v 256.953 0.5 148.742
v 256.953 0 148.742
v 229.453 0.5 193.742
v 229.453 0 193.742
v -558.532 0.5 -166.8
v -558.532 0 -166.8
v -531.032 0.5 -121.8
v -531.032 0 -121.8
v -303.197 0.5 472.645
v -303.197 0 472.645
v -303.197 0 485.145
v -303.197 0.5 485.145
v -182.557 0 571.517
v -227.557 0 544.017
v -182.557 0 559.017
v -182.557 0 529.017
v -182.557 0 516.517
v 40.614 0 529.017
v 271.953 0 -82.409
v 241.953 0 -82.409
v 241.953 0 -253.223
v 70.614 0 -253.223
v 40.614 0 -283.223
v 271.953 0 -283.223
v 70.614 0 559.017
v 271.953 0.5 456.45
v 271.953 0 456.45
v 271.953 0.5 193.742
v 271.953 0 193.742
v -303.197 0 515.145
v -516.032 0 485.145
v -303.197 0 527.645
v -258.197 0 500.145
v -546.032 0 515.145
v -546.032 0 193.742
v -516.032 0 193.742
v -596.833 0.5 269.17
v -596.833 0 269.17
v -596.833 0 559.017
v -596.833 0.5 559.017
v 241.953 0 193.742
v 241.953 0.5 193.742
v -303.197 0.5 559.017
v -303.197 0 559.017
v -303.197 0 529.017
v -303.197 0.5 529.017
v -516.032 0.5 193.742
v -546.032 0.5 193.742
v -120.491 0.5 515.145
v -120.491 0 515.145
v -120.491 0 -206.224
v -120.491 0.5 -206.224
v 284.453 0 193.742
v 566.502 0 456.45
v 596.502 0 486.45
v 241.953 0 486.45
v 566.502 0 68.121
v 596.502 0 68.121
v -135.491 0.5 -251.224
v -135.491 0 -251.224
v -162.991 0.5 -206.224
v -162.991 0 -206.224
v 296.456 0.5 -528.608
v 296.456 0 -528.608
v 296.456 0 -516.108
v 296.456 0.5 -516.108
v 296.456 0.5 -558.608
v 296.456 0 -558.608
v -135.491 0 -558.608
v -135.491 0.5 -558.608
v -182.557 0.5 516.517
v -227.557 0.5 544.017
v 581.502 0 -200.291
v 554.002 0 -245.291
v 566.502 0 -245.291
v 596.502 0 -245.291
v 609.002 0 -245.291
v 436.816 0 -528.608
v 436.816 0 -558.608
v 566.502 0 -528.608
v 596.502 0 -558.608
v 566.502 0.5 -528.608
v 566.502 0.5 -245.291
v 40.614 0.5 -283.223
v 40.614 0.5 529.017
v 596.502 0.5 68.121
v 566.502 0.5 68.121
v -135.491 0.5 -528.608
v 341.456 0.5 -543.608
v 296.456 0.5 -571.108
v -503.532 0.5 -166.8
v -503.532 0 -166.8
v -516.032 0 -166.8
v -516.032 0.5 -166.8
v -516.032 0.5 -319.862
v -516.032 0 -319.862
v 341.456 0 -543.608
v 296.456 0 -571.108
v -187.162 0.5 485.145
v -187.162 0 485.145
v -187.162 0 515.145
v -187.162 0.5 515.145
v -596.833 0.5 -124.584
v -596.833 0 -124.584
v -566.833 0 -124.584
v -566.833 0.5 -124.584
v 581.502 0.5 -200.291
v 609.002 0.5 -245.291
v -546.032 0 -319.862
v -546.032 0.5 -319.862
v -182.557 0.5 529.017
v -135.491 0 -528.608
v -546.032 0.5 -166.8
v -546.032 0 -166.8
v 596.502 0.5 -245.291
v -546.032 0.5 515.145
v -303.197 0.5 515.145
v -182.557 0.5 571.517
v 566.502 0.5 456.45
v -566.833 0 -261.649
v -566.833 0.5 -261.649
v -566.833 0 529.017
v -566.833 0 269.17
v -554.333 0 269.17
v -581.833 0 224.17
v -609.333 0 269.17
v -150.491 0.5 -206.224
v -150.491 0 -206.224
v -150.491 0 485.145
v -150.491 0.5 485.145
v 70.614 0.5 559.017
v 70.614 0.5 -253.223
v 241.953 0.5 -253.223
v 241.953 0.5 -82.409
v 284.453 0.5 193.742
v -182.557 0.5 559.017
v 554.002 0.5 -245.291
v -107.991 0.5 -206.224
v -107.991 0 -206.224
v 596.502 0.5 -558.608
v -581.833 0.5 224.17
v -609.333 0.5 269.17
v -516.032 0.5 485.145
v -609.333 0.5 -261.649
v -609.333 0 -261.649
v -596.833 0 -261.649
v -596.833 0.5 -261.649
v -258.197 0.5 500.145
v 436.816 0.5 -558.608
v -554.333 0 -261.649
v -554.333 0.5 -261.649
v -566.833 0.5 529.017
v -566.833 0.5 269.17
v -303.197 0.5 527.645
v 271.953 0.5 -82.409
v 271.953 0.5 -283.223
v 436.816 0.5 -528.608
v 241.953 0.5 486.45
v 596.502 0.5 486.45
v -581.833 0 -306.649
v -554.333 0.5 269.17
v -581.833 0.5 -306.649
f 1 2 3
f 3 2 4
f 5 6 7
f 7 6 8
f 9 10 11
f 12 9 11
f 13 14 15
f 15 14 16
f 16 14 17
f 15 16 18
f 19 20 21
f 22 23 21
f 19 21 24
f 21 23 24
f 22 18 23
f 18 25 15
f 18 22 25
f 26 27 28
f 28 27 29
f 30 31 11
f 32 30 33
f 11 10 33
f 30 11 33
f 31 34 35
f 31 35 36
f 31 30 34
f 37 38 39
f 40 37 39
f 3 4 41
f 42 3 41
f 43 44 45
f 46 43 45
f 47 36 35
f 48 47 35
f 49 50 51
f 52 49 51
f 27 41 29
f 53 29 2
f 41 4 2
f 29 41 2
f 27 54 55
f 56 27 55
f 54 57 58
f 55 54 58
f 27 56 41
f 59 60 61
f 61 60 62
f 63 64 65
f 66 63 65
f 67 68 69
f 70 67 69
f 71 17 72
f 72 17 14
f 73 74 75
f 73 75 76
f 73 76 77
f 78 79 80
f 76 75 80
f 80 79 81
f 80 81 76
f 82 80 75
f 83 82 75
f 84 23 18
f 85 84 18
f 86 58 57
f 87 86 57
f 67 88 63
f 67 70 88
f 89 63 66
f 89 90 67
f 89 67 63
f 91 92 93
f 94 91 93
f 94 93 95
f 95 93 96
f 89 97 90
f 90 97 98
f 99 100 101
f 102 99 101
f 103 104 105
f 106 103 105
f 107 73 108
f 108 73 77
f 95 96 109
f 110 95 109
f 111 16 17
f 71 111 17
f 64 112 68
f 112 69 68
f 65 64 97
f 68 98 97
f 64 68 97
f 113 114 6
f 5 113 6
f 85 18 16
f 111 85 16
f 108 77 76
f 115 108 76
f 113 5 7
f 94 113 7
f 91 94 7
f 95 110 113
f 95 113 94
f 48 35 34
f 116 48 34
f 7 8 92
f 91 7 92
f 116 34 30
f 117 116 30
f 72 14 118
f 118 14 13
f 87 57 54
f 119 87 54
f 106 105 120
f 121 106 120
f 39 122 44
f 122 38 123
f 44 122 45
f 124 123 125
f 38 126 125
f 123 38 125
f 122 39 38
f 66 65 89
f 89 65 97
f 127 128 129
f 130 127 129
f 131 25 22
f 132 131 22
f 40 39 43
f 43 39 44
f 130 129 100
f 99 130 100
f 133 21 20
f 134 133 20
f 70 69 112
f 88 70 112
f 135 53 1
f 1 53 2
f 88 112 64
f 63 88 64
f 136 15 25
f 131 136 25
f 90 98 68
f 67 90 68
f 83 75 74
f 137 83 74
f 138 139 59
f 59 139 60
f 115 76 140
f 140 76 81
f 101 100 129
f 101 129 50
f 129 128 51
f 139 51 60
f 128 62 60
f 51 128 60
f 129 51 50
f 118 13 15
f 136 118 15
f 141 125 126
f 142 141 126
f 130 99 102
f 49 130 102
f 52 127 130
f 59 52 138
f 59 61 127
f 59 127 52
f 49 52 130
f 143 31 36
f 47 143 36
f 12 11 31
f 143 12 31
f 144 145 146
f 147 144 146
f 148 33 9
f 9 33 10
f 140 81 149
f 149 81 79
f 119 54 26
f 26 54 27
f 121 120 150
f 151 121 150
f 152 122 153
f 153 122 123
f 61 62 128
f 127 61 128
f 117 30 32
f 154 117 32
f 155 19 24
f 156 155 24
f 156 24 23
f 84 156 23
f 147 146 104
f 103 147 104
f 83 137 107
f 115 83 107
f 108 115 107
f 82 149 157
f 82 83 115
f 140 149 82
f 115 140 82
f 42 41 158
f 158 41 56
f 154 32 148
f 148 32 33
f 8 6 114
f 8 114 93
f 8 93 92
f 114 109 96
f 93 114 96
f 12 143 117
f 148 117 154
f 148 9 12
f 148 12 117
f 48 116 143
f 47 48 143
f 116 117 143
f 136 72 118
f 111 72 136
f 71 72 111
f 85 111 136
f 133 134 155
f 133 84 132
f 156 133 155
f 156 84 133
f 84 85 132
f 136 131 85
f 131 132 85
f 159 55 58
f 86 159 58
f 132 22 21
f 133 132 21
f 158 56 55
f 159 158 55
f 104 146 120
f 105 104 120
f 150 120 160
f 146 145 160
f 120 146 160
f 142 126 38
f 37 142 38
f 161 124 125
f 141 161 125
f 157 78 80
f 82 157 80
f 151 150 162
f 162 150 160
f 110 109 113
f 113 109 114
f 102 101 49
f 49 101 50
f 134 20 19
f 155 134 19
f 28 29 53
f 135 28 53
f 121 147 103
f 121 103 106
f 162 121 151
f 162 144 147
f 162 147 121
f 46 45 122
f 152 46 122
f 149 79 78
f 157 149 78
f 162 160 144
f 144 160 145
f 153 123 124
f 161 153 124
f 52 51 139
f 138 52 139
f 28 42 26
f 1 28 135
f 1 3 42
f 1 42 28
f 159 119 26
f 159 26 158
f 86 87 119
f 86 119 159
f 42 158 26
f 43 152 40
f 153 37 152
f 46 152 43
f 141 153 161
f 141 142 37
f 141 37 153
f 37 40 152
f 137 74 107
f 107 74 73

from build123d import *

# Parameters (mm, degrees)
BOSS_EXTRUDE2_DEPTH   = 0.5
BOSS_EXTRUDE2_2_DEPTH = 0.5
BOSS_EXTRUDE2_3_DEPTH = 0.5
BOSS_EXTRUDE2_4_DEPTH = 0.5
BOSS_EXTRUDE2_5_DEPTH = 0.5
BOSS_EXTRUDE2_6_DEPTH = 0.5
BOSS_EXTRUDE2_7_DEPTH = 0.5
BOSS_EXTRUDE2_8_DEPTH = 0.5
BOSS_EXTRUDE2_9_DEPTH = 0.5


with BuildPart() as part:
    # Sketch2 → Boss-Extrude2 (new body)
    with BuildSketch(Plane(origin=(0, 0, 0), x_dir=(1, 0, 0), z_dir=(0, 1, 0))):
        Polygon((-546.031568855, 319.862112689), (-546.031568855, 166.799956279), (-558.531568855, 166.799956279), (-531.031568855, 121.799956279), (-503.531568855, 166.799956279), (-516.031568855, 166.799956279), (-516.031568855, 319.862112689), align=None)
    extrude(amount=BOSS_EXTRUDE2_DEPTH)


with BuildPart() as body_2:
    # Sketch2 → Boss-Extrude2 2 (new body)
    with BuildSketch(Plane(origin=(0, 0, 0), x_dir=(1, 0, 0), z_dir=(0, 1, 0))):
        Polygon((-566.833224962, 124.583741857), (-566.833224962, 261.648764577), (-554.333224962, 261.648764577), (-581.833224962, 306.648764577), (-609.333224962, 261.648764577), (-596.833224962, 261.648764577), (-596.833224962, 124.583741857), align=None)
    extrude(amount=BOSS_EXTRUDE2_2_DEPTH)


with BuildPart() as body_3:
    # Sketch2 → Boss-Extrude2 3 (new body)
    with BuildSketch(Plane(origin=(0, 0, 0), x_dir=(1, 0, 0), z_dir=(0, 1, 0))):
        Polygon((-546.031568855, -193.74164228), (-546.031568855, -515.145479506), (-303.196960885, -515.145479506), (-303.196960885, -527.645479506), (-258.196960885, -500.145479506), (-303.196960885, -472.645479506), (-303.196960885, -485.145479506), (-516.031568855, -485.145479506), (-516.031568855, -193.74164228), align=None)
    extrude(amount=BOSS_EXTRUDE2_3_DEPTH)


with BuildPart() as body_4:
    # Sketch2 → Boss-Extrude2 4 (new body)
    with BuildSketch(Plane(origin=(0, 0, 0), x_dir=(1, 0, 0), z_dir=(0, 1, 0))):
        Polygon((-303.196960885, -529.017288308), (-566.833224962, -529.017288308), (-566.833224962, -269.169915432), (-554.333224962, -269.169915432), (-581.833224962, -224.169915432), (-609.333224962, -269.169915432), (-596.833224962, -269.169915432), (-596.833224962, -559.017288308), (-303.196960885, -559.017288308), align=None)
    extrude(amount=BOSS_EXTRUDE2_4_DEPTH)


with BuildPart() as body_5:
    # Sketch2 → Boss-Extrude2 5 (new body)
    with BuildSketch(Plane(origin=(0, 0, 0), x_dir=(1, 0, 0), z_dir=(0, 1, 0))):
        Polygon((-187.162371639, -515.145479506), (-120.490718616, -515.145479506), (-120.490718616, 206.224391534), (-107.990718616, 206.224391534), (-135.490718616, 251.224391534), (-162.990718616, 206.224391534), (-150.490718616, 206.224391534), (-150.490718616, -485.145479506), (-187.162371639, -485.145479506), align=None)
    extrude(amount=BOSS_EXTRUDE2_5_DEPTH)


with BuildPart() as body_6:
    # Sketch2 → Boss-Extrude2 6 (new body)
    with BuildSketch(Plane(origin=(0, 0, 0), x_dir=(1, 0, 0), z_dir=(0, 1, 0))):
        Polygon((271.952509575, 82.408764577), (271.952509575, 283.223482013), (40.614122477, 283.223482013), (40.614122477, -529.017288308), (-182.557040075, -529.017288308), (-182.557040075, -516.517288308), (-227.557040075, -544.017288308), (-182.557040075, -571.517288308), (-182.557040075, -559.017288308), (70.614122477, -559.017288308), (70.614122477, 253.223482013), (241.952509575, 253.223482013), (241.952509575, 82.408764577), align=None)
    extrude(amount=BOSS_EXTRUDE2_6_DEPTH)


with BuildPart() as body_7:
    # Sketch2 → Boss-Extrude2 7 (new body)
    with BuildSketch(Plane(origin=(0, 0, 0), x_dir=(1, 0, 0), z_dir=(0, 1, 0))):
        Polygon((-135.490718616, 528.607988525), (296.456327596, 528.607988525), (296.456327596, 516.107988525), (341.456327596, 543.607988525), (296.456327596, 571.107988525), (296.456327596, 558.607988525), (-135.490718616, 558.607988525), align=None)
    extrude(amount=BOSS_EXTRUDE2_7_DEPTH)


with BuildPart() as body_8:
    # Sketch2 → Boss-Extrude2 8 (new body)
    with BuildSketch(Plane(origin=(0, 0, 0), x_dir=(1, 0, 0), z_dir=(0, 1, 0))):
        Polygon((436.816285163, 528.607988525), (566.502204629, 528.607988525), (566.502204629, 245.290532335), (554.002204629, 245.290532335), (581.502204629, 200.290532335), (609.002204629, 245.290532335), (596.502204629, 245.290532335), (596.502204629, 558.607988525), (436.816285163, 558.607988525), align=None)
    extrude(amount=BOSS_EXTRUDE2_8_DEPTH)


with BuildPart() as body_9:
    # Sketch2 → Boss-Extrude2 9 (new body)
    with BuildSketch(Plane(origin=(0, 0, 0), x_dir=(1, 0, 0), z_dir=(0, 1, 0))):
        Polygon((566.502204629, -68.121309006), (566.502204629, -456.449956977), (271.952509575, -456.449956977), (271.952509575, -193.74164228), (284.452509575, -193.74164228), (256.952509575, -148.74164228), (229.452509575, -193.74164228), (241.952509575, -193.74164228), (241.952509575, -486.449956977), (596.502204629, -486.449956977), (596.502204629, -68.121309006), align=None)
    extrude(amount=BOSS_EXTRUDE2_9_DEPTH)


solid = Compound([part.part, body_2.part, body_3.part, body_4.part, body_5.part, body_6.part, body_7.part, body_8.part, body_9.part])
